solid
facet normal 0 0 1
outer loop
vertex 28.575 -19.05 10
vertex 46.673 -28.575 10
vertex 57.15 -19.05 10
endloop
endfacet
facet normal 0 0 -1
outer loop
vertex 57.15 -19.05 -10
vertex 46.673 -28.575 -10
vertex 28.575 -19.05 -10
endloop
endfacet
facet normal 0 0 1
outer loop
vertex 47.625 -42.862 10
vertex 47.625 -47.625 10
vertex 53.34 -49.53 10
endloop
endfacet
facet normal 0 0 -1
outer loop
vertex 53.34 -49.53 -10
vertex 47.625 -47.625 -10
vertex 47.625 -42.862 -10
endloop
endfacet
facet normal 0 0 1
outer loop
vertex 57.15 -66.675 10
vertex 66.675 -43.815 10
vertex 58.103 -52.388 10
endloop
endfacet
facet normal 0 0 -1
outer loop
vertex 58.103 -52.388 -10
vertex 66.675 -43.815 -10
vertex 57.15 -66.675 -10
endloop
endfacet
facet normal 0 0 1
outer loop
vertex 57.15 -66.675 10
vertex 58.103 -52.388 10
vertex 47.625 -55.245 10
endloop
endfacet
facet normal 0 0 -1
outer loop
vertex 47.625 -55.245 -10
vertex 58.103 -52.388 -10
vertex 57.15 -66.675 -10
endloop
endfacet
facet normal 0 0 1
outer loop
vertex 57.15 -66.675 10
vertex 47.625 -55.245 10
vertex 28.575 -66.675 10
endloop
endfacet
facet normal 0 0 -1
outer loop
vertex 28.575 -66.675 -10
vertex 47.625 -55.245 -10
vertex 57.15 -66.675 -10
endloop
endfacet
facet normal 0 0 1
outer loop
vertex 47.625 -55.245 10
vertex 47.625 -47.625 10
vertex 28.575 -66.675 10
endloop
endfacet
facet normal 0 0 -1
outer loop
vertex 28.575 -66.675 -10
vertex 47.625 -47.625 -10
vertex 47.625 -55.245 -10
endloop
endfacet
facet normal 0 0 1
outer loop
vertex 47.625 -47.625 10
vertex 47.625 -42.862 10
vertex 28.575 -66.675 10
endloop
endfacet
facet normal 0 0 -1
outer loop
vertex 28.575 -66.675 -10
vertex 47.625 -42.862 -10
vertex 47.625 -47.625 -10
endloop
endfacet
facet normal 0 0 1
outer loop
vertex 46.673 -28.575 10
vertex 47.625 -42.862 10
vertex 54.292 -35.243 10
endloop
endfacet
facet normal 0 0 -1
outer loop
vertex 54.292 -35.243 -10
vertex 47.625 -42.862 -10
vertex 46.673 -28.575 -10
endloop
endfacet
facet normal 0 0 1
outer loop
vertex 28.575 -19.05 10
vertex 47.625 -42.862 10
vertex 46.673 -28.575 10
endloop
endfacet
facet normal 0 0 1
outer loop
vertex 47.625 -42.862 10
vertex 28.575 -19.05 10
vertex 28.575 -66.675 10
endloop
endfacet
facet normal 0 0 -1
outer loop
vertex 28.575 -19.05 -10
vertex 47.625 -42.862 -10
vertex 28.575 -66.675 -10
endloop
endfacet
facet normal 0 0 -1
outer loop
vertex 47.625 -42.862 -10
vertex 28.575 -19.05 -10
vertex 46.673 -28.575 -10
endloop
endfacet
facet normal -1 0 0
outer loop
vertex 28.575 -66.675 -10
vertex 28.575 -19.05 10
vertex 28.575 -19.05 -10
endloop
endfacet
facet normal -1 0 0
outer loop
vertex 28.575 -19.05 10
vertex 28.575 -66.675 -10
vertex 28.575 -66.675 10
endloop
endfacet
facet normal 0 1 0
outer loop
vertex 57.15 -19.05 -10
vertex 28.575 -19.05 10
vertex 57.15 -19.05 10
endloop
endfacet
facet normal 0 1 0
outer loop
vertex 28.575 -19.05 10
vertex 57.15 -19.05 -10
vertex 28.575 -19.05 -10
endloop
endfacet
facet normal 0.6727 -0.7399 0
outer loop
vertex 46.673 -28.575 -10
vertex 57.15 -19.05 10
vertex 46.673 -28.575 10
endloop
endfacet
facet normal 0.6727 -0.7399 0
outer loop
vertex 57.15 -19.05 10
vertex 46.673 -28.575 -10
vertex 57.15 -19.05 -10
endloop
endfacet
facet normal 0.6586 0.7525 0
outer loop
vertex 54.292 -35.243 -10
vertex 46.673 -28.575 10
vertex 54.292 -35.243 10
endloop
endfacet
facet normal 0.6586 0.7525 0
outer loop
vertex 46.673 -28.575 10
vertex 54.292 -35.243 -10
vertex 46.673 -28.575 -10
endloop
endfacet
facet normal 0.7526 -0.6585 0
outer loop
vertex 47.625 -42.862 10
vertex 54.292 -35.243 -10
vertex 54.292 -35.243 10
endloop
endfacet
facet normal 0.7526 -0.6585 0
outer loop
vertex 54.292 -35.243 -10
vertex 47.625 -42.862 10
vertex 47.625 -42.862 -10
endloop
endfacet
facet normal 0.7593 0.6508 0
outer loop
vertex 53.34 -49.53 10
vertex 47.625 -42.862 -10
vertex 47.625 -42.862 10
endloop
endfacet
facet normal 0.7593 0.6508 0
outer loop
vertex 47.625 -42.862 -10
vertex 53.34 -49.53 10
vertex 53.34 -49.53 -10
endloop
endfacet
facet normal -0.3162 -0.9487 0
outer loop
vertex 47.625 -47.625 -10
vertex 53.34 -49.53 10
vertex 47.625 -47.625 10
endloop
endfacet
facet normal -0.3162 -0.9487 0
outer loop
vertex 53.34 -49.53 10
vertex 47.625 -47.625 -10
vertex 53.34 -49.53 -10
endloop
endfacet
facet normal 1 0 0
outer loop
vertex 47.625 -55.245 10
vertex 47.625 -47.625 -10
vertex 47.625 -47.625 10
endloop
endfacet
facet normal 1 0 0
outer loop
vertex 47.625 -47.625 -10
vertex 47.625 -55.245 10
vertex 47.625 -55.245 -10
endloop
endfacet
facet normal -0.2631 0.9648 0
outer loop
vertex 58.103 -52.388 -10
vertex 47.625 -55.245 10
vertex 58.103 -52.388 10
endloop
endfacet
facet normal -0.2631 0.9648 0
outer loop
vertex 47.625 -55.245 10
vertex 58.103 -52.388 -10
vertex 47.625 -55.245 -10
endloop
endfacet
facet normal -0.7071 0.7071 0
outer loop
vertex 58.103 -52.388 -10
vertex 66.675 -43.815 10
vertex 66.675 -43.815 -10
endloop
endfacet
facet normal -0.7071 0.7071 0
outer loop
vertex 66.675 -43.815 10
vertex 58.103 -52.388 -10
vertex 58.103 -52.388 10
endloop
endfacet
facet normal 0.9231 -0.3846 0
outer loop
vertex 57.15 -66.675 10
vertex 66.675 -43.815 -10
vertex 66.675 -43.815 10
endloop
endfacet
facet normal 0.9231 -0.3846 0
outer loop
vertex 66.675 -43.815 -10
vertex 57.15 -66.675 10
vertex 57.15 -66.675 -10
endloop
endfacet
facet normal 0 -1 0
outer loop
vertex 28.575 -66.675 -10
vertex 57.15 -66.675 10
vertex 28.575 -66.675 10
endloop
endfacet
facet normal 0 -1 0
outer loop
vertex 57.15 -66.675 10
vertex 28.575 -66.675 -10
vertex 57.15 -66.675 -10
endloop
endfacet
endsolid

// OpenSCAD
polyhedron(
    points=[
    [28.575, -66.675, 10],
    [28.575, -19.05, 10],
    [57.15, -19.05, 10],
    [46.6725, -28.575, 10],
    [54.2925, -35.2425, 10],
    [47.625, -42.8625, 10],
    [53.34, -49.53, 10],
    [47.625, -47.625, 10],
    [47.625, -55.245, 10],
    [58.1025, -52.3875, 10],
    [66.675, -43.815, 10],
    [57.15, -66.675, 10],
    [28.575, -66.675, -10],
    [28.575, -19.05, -10],
    [57.15, -19.05, -10],
    [46.6725, -28.575, -10],
    [54.2925, -35.2425, -10],
    [47.625, -42.8625, -10],
    [53.34, -49.53, -10],
    [47.625, -47.625, -10],
    [47.625, -55.245, -10],
    [58.1025, -52.3875, -10],
    [66.675, -43.815, -10],
    [57.15, -66.675, -10],
    ],
    faces=[
        [2,3,1],
        [13,15,14],
        [6,7,5],
        [17,19,18],
        [9,10,11],
        [23,22,21],
        [8,9,11],
        [23,21,20],
        [0,8,11],
        [23,20,12],
        [0,7,8],
        [20,19,12],
        [0,5,7],
        [19,17,12],
        [4,5,3],
        [15,17,16],
        [3,5,0,1],
        [13,12,17,15],
        [0,12,13,1],
        [1,13,14,2],
        [2,14,15,3],
        [3,15,16,4],
        [4,16,17,5],
        [5,17,18,6],
        [6,18,19,7],
        [7,19,20,8],
        [8,20,21,9],
        [9,21,22,10],
        [10,22,23,11],
        [11,23,12,0],
    ]
);
